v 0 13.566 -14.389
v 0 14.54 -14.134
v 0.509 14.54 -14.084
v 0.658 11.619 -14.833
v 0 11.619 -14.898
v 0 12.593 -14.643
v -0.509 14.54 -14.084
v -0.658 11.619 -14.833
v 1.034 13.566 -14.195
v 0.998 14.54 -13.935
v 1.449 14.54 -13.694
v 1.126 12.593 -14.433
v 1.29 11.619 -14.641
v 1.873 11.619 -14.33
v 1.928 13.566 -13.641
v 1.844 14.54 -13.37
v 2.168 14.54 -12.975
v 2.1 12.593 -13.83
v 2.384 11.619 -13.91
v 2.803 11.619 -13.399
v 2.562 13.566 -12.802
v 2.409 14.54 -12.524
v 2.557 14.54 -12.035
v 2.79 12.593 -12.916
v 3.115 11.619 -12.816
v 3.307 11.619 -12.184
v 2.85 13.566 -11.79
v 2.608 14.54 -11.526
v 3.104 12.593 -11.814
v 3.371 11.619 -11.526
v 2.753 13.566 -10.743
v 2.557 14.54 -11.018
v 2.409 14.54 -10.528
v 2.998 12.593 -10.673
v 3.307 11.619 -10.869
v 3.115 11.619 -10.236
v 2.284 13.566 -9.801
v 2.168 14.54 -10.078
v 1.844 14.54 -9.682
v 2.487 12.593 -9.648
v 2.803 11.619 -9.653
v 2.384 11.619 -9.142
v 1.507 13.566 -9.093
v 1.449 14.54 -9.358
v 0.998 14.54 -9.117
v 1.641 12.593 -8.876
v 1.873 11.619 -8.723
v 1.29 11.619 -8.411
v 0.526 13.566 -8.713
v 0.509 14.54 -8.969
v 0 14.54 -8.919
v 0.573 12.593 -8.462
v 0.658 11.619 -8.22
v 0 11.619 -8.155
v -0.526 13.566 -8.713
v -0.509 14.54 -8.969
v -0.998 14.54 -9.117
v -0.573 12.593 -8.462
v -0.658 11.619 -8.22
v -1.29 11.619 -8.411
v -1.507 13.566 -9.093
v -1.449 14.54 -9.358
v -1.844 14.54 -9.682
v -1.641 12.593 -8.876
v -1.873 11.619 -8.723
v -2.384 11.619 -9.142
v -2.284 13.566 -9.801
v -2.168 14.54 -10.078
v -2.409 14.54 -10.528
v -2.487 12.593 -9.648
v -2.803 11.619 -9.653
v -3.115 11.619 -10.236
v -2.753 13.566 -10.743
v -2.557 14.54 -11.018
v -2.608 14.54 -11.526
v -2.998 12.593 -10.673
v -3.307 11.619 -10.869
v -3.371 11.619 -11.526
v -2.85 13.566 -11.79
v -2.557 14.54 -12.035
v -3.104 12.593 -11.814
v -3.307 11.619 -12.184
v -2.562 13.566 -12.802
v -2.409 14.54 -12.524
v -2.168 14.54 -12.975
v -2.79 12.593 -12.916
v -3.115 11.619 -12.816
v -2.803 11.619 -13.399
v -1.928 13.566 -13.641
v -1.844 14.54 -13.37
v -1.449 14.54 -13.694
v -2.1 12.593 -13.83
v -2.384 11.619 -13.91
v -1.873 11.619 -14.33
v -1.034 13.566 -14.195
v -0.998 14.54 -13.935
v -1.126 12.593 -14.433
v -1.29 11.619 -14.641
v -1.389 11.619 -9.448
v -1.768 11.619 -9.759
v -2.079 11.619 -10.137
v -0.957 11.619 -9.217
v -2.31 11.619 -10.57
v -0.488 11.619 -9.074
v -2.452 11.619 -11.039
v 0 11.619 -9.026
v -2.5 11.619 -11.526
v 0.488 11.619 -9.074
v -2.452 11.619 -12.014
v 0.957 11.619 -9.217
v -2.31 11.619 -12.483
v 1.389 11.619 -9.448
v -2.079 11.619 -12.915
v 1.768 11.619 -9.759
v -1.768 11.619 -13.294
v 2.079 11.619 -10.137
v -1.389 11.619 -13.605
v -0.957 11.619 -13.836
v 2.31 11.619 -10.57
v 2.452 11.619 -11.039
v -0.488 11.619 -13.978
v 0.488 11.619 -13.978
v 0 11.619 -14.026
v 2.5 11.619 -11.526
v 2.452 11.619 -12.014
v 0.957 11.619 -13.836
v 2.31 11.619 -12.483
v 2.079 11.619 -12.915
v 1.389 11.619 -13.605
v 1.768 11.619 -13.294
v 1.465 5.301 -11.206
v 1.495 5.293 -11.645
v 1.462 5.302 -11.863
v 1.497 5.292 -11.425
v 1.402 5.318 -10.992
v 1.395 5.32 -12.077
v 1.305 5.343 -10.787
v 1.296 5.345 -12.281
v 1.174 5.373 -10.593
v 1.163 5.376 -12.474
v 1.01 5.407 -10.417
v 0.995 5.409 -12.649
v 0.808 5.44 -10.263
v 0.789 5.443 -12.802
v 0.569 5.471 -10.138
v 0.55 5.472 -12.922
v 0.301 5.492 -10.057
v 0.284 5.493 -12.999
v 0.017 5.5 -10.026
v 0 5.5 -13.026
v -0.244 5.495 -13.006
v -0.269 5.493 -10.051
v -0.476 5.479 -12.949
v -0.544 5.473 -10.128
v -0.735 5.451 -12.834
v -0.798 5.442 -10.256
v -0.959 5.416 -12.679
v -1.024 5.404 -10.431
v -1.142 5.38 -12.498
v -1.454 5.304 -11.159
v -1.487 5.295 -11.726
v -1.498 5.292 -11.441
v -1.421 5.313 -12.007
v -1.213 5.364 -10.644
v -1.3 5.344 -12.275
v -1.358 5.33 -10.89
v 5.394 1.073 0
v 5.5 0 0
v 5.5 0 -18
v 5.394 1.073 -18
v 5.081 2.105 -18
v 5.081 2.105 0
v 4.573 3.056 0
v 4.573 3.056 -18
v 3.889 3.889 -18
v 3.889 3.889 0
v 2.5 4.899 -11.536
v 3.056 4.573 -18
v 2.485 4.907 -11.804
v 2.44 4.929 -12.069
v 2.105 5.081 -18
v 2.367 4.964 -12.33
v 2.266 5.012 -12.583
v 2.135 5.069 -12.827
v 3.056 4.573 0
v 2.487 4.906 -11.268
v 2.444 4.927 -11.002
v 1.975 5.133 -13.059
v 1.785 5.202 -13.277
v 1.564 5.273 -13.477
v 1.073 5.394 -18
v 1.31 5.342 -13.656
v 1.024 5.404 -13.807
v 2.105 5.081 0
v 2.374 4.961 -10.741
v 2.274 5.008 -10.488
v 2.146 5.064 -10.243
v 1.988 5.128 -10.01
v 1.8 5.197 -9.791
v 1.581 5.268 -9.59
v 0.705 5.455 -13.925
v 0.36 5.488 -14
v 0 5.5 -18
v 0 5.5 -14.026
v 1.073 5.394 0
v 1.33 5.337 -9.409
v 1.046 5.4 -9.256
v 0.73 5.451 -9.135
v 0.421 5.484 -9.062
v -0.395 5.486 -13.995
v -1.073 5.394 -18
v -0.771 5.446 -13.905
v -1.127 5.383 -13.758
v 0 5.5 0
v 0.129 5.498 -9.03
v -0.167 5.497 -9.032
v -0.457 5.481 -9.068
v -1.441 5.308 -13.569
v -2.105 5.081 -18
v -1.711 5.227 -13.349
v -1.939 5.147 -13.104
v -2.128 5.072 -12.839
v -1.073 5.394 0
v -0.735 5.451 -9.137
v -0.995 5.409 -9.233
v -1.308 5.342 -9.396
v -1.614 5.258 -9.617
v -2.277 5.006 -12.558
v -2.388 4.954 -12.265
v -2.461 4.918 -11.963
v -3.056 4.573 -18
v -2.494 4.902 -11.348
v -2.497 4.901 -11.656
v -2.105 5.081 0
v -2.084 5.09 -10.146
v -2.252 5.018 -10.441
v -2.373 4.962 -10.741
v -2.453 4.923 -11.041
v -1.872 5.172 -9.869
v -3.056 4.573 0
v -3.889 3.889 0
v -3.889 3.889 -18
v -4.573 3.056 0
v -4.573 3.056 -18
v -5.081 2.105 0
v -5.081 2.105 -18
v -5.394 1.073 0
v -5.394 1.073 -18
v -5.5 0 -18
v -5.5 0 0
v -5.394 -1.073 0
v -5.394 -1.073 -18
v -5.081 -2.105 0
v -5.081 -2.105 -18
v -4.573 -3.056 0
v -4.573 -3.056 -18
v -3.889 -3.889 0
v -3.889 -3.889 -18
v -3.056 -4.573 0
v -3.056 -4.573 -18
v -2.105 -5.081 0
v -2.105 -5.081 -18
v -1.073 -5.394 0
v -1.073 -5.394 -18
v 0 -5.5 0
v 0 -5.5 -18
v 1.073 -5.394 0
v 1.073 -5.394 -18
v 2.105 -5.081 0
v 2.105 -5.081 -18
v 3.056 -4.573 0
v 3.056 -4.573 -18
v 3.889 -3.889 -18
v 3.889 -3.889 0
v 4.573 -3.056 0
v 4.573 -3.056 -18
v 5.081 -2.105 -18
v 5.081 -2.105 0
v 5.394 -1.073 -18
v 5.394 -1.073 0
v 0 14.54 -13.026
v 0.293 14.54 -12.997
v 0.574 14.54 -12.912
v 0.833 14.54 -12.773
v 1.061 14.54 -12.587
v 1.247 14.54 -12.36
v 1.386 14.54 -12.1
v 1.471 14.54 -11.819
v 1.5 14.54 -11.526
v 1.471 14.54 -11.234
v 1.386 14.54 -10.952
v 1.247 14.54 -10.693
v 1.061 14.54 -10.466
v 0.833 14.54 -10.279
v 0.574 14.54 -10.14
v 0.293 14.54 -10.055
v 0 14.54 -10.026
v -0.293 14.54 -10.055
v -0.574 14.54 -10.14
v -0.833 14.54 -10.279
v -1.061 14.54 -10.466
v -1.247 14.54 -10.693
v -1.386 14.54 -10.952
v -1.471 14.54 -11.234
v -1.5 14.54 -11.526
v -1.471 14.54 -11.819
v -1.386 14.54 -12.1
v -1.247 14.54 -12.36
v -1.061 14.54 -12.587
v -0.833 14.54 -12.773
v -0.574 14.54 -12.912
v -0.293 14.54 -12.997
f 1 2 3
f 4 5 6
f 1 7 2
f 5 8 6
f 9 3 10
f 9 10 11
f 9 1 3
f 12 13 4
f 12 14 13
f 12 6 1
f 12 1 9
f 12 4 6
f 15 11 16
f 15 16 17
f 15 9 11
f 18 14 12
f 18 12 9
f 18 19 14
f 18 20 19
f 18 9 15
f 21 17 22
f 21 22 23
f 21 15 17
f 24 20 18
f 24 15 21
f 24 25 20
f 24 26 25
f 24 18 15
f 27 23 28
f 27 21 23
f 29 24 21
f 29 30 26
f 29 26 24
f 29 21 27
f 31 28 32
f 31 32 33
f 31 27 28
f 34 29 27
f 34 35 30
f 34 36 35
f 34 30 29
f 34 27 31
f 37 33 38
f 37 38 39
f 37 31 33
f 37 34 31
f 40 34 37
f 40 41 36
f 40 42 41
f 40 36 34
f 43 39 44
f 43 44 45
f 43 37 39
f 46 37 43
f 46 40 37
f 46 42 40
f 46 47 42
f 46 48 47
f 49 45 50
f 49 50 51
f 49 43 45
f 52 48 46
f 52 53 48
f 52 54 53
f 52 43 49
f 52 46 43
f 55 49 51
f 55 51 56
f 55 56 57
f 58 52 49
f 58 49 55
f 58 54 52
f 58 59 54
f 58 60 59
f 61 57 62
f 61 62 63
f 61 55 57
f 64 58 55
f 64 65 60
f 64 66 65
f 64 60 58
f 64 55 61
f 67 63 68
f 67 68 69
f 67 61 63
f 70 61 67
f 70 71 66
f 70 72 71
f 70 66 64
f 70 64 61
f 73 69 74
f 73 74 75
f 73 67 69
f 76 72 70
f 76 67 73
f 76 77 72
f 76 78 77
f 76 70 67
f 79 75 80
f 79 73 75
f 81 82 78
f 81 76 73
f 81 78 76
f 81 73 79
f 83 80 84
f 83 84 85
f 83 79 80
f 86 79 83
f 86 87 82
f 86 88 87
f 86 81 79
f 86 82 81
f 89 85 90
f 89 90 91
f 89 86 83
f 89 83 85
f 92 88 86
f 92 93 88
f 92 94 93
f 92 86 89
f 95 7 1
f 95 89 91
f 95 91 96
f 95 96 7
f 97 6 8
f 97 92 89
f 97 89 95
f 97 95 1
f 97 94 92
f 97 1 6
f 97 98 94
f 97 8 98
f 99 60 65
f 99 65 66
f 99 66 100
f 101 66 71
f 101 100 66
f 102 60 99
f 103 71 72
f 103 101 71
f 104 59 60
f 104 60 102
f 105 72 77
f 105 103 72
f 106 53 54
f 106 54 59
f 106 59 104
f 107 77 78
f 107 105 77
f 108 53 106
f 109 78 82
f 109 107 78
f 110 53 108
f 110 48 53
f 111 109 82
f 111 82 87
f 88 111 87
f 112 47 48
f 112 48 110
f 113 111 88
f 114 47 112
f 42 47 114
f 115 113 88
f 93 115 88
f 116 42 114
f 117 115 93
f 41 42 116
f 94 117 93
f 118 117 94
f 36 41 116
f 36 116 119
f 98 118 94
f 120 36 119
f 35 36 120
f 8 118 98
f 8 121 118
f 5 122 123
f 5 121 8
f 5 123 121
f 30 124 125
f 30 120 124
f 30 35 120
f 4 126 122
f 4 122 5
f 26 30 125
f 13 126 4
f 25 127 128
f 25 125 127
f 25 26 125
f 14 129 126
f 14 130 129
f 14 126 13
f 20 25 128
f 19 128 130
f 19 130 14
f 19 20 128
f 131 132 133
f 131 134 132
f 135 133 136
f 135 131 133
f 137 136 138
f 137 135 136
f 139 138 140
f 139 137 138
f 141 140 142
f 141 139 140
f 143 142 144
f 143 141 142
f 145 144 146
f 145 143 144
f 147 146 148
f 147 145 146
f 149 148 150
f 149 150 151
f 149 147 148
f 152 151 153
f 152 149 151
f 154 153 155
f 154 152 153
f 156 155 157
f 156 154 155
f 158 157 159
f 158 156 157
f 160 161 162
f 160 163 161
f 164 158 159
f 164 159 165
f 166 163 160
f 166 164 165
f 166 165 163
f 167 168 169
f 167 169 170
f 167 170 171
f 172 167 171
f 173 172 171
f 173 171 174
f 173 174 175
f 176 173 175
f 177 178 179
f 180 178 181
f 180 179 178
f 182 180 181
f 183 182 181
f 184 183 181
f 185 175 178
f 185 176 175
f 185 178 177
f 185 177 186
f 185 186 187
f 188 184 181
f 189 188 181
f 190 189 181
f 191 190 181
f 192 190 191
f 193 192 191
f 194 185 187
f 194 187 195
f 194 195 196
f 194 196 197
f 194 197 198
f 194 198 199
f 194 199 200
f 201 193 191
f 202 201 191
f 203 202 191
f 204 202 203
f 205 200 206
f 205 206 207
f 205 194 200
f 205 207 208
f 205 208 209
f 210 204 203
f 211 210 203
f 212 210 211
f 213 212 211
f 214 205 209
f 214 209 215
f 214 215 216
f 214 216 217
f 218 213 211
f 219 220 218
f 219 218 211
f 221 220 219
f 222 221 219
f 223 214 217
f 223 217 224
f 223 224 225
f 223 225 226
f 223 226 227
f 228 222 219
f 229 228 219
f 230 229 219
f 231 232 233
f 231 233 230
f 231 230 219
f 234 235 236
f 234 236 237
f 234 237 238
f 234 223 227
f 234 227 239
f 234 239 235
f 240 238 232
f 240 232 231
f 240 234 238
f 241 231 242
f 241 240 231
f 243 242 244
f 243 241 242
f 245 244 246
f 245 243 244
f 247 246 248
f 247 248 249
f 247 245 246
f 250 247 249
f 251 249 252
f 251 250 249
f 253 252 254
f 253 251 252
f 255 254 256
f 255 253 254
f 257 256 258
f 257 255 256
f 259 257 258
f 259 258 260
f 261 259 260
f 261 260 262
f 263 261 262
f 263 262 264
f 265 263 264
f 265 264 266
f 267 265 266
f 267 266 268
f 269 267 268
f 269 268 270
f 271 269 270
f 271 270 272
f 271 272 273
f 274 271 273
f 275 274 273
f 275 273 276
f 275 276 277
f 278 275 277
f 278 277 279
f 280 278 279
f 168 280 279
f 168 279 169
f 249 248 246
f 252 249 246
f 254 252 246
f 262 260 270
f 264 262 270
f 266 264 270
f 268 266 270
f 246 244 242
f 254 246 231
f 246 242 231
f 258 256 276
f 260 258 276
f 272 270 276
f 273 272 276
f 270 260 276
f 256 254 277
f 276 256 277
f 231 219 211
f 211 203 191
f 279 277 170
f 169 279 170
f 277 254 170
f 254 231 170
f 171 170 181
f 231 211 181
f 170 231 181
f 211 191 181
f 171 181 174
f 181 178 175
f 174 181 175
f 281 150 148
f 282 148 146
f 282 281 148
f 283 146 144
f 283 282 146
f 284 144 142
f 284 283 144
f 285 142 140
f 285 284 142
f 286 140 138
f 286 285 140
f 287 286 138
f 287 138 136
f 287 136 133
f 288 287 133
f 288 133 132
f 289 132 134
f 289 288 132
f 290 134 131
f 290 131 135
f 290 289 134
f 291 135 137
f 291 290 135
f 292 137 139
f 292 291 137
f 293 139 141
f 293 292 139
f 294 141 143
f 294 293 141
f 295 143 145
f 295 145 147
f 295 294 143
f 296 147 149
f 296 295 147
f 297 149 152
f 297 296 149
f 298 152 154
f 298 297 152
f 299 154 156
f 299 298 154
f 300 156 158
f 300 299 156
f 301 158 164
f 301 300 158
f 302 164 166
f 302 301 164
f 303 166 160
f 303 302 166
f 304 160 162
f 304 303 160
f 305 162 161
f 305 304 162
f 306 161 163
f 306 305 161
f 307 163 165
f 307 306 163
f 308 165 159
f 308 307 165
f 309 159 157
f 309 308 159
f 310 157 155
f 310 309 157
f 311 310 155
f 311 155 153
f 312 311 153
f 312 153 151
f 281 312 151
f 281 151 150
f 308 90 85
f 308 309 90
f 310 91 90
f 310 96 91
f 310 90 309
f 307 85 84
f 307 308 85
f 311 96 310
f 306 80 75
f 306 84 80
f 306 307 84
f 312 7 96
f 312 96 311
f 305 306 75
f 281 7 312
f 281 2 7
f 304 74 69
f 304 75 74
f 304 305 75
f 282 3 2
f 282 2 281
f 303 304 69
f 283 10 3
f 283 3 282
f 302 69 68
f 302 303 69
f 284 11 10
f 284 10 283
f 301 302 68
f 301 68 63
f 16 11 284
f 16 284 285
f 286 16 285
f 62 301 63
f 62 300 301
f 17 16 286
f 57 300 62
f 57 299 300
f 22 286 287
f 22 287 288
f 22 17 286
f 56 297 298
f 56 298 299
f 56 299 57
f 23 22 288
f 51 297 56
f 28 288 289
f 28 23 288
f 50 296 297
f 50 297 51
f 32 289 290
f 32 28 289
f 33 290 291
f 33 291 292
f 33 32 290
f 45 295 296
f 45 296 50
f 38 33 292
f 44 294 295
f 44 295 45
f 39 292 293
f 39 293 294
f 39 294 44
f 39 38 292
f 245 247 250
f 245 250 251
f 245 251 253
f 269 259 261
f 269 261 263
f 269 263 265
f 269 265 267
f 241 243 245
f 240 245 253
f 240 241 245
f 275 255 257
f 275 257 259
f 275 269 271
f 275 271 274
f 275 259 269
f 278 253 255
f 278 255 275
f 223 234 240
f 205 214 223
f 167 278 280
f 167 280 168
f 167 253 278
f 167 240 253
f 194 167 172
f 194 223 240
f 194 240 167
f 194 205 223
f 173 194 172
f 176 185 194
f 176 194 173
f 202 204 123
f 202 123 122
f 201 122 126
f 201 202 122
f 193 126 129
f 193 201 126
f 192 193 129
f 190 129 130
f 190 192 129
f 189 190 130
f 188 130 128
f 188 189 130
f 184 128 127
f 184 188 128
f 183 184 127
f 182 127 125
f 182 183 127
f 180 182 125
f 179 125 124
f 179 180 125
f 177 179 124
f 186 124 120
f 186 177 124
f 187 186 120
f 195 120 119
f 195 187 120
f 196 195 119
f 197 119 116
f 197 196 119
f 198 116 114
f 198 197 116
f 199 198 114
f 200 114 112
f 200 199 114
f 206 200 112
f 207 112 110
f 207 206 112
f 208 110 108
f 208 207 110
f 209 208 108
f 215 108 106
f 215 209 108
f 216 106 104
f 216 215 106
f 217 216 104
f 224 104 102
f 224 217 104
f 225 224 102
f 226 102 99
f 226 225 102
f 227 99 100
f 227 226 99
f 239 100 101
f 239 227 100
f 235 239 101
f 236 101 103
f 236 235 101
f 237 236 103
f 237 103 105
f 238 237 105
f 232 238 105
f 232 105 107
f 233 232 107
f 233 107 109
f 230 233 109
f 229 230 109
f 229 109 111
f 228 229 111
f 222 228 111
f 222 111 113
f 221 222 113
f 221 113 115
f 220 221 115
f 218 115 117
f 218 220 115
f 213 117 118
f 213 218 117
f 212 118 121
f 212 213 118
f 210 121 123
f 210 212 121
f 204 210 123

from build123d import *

# Parameters (mm, degrees)
SKETCH1_R           = 5.5
BOSS_EXTRUDE1_DEPTH = 18


with BuildPart() as part:
    # Sketch1 → Boss-Extrude1 (new body)
    with BuildSketch(Plane.XY):
        Circle(SKETCH1_R)
    extrude(amount=-BOSS_EXTRUDE1_DEPTH)

    # Sketch3 → Revolve1 (revolve)
    with BuildSketch(Plane(origin=(0, 0, 0), x_dir=(0, 0, -1), z_dir=(1, 0, 0))):
        Polygon((13.026280971, 14.539629518), (14.13388163, 14.539629518), (14.897758762, 11.619086594), (14.026280971, 11.619086594), (14.026280971, 0.039629518), (13.026280971, 0.039629518), align=None)
    revolve(axis=Axis((0, 14.539629518, -11.526280971), (0, -1, 0)))


solid = part.part
